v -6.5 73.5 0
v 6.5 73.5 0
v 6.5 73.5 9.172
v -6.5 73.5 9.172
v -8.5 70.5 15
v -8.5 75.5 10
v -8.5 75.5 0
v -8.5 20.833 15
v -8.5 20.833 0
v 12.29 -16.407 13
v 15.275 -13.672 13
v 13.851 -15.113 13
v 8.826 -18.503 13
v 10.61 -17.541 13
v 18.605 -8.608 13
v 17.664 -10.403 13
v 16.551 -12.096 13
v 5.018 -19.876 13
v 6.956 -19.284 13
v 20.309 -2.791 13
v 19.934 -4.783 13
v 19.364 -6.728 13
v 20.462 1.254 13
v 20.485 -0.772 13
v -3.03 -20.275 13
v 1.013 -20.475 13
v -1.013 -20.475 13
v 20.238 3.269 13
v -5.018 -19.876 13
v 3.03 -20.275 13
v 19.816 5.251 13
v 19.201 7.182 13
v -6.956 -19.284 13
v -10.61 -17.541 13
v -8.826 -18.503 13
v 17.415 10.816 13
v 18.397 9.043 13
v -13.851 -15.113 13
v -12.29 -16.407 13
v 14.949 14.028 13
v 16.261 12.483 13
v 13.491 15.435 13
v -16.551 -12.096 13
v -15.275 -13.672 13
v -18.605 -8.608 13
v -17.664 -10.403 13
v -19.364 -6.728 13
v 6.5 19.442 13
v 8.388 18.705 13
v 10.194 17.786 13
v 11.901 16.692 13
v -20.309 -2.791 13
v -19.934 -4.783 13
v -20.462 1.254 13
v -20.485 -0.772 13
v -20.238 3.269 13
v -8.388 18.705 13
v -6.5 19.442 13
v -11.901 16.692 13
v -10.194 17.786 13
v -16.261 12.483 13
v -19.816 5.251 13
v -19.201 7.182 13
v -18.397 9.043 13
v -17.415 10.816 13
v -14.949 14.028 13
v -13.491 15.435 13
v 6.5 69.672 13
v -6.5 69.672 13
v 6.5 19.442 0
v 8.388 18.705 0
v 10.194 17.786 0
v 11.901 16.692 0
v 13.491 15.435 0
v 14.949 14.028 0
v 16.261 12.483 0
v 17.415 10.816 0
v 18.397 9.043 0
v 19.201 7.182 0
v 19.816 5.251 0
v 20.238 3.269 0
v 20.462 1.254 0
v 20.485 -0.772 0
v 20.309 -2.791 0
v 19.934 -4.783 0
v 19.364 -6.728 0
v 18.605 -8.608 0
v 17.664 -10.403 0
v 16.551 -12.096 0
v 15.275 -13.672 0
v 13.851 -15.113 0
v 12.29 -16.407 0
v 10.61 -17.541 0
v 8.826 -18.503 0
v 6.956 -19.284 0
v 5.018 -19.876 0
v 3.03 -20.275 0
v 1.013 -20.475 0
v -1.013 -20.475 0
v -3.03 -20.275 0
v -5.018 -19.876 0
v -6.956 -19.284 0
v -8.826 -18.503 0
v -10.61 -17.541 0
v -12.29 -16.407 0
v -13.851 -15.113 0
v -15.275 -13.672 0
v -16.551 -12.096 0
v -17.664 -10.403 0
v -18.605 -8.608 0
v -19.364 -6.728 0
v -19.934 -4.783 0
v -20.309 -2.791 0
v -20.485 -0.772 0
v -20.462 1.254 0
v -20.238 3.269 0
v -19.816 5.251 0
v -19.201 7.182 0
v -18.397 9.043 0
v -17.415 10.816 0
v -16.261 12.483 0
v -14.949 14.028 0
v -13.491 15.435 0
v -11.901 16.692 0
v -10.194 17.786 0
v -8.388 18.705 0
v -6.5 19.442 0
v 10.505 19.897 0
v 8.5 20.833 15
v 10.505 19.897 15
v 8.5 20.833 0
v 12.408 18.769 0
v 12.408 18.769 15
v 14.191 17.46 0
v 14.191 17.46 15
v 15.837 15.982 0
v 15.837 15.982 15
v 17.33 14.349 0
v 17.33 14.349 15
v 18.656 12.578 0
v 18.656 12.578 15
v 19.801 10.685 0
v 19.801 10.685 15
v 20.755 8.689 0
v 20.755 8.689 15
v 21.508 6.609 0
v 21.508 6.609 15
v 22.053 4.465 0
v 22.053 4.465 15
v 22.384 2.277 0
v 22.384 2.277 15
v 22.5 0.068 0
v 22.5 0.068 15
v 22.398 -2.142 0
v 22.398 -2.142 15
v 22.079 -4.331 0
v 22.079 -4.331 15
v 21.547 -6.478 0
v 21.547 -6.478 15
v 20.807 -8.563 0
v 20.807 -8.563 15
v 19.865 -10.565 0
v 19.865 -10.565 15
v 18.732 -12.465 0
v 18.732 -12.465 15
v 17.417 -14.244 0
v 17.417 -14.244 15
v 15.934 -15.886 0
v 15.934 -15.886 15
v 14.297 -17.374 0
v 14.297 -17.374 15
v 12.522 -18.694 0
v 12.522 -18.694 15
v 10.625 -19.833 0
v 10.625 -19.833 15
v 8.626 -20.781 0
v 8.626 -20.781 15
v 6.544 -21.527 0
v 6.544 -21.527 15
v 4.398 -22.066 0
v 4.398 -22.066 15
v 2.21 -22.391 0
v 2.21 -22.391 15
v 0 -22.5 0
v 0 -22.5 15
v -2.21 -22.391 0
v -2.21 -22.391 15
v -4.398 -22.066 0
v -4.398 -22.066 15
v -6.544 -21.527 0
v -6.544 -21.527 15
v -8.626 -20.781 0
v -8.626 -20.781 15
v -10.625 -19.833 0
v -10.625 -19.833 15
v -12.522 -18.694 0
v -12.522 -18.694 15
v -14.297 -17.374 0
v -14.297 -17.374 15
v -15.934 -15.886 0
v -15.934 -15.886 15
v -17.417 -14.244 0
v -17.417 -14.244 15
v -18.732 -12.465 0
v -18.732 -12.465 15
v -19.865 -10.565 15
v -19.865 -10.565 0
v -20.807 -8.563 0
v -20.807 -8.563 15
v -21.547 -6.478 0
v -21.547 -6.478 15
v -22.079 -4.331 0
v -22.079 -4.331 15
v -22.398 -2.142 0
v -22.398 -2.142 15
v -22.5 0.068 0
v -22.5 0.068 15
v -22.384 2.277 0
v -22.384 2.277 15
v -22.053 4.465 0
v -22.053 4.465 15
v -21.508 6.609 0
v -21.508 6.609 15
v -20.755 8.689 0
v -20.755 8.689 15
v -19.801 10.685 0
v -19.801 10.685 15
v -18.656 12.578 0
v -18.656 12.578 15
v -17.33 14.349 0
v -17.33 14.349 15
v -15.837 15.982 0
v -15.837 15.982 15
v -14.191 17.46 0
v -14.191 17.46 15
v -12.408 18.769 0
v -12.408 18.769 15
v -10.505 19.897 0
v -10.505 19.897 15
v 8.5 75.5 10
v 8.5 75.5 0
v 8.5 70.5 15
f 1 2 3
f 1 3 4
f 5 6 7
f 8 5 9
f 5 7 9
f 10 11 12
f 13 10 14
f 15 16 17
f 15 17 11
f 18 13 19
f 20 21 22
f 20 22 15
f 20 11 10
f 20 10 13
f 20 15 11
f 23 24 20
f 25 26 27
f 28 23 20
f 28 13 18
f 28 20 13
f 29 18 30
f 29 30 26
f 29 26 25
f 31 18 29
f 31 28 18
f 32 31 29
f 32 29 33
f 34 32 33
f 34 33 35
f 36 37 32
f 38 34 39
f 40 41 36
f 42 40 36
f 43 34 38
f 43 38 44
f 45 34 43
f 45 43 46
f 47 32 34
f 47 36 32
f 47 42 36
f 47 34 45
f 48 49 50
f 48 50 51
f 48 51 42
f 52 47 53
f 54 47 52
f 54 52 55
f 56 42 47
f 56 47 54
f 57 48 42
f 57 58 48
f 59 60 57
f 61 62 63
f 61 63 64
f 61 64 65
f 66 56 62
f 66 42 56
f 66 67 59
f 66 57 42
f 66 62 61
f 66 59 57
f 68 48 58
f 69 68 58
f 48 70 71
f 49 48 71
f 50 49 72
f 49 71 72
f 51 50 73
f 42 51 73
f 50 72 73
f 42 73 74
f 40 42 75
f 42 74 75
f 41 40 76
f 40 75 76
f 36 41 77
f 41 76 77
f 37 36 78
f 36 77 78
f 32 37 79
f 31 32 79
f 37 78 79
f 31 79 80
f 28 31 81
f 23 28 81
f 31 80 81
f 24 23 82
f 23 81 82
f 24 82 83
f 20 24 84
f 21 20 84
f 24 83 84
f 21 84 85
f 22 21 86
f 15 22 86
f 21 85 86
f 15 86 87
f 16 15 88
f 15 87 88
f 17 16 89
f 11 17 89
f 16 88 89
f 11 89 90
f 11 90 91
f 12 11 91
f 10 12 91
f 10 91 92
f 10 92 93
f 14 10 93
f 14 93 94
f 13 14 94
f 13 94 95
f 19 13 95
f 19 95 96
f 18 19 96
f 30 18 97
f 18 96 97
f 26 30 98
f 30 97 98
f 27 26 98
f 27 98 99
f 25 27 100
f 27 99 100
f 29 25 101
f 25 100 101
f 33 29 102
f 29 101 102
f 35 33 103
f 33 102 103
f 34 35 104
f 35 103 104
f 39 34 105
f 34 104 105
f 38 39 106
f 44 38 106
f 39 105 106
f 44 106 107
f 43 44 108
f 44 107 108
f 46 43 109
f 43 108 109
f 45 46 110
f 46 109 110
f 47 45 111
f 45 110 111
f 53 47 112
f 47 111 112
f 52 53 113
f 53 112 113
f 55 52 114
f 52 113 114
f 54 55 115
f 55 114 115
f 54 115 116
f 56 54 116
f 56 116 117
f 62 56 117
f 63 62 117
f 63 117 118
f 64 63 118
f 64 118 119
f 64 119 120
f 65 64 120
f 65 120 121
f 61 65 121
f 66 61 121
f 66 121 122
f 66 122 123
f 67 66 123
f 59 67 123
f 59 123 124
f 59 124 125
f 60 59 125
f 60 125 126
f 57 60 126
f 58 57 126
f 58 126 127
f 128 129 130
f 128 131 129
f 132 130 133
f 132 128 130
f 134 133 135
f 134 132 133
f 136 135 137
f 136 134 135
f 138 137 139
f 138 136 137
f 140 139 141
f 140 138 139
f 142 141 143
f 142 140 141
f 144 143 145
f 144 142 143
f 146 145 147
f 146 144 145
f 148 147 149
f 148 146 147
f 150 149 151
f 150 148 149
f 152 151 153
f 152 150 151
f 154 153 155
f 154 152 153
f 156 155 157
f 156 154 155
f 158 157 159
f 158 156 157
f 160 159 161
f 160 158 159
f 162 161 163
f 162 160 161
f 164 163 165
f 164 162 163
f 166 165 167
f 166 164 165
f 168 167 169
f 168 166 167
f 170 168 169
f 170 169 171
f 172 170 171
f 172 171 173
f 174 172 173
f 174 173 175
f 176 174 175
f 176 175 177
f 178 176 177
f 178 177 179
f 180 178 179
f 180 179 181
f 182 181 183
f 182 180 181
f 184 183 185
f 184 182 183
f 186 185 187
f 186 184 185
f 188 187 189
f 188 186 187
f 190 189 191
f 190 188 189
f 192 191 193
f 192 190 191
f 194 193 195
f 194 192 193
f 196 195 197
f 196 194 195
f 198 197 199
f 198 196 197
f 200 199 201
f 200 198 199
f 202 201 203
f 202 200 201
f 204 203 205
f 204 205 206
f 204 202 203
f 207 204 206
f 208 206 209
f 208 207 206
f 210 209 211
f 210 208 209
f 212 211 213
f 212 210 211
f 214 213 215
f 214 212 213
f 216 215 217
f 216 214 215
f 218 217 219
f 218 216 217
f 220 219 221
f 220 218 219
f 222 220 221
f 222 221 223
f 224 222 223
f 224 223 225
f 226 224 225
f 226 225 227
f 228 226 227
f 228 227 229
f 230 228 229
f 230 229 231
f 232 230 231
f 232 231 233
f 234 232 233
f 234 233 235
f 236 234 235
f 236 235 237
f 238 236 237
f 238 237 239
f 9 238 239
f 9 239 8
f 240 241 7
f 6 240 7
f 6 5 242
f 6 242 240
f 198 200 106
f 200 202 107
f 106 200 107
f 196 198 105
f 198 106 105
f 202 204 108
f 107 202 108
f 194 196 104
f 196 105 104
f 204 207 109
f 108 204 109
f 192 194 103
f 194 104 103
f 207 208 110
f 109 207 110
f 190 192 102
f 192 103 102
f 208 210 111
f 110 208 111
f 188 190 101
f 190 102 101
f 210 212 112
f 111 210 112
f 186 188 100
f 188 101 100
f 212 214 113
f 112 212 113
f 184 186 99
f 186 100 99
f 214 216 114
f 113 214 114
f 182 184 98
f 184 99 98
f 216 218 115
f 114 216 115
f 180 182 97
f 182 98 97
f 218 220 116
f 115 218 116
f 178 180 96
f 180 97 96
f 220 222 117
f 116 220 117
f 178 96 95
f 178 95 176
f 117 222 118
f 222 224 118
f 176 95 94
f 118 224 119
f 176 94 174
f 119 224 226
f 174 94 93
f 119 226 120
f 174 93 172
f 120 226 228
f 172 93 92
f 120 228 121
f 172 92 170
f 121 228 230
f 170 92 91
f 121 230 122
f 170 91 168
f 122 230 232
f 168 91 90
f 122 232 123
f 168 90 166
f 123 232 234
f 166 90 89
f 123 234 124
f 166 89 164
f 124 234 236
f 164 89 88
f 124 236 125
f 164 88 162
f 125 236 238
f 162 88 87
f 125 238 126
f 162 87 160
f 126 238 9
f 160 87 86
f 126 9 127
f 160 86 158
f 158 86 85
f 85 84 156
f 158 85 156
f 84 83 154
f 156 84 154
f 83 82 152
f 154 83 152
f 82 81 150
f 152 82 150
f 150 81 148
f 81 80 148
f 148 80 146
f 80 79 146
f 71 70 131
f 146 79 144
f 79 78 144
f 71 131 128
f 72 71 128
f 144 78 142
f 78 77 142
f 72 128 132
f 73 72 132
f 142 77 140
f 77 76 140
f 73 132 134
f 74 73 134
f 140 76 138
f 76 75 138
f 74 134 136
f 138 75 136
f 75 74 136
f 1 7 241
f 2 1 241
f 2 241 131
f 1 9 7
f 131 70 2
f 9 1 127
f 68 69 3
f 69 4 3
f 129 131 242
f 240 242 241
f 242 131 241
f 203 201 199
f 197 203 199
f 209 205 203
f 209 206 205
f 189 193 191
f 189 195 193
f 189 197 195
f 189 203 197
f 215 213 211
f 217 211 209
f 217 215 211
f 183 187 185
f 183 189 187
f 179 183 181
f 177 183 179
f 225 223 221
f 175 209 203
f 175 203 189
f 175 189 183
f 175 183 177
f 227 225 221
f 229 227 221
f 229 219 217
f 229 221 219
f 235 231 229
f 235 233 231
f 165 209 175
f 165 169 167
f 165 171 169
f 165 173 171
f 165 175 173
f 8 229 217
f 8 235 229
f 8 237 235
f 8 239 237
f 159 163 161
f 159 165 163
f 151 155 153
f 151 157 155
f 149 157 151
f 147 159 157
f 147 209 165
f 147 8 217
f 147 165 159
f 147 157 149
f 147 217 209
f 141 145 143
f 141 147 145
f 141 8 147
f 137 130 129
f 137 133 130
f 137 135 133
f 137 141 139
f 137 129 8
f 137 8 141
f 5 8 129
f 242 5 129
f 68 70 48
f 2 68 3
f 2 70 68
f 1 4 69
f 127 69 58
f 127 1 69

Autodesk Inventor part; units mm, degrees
ref_plane "YZ Plane" through (0, 0, 0) normal (1, 0, 0) x (0, 1, 0)
ref_plane "XZ Plane" through (0, 0, 0) normal (0, 1, 0) x (-1, 0, 0)
ref_plane "XY Plane" through (0, 0, 0) normal (0, 0, 1) x (1, 0, 0)
sketch "Sketch3" plane through (0, 0, 0) normal (0, 0, 1) x (1, 0, 0)
  circle A0 centre (0, 0) radius 22.5
  line L0 (-8.5, 0) -> (8.5, 0)
  line L1 (8.5, 0) -> (8.5, 75.5)
  line L2 (8.5, 75.5) -> (-8.5, 75.5)
  line L3 (-8.5, 75.5) -> (-8.5, 0)
  dimension "d5" = 45
  dimension "d6" = 75.5
  dimension "d7" = 17
extrude "Extrusion3" add sketch "Sketch3" along normal blind 15
sketch "Sketch4" plane through (0, 0, 0) normal (0, 0, -1) x (-1, 0, 0)
  arc A0 (-8.5, 20.8327) -> (8.5, 20.8327) centre (0, 0) ccw projected
  line L0 (8.5, 75.5) -> (8.5, 20.8327) projected
  line L1 (-8.5, 75.5) -> (8.5, 75.5) projected
  line L2 (-8.5, 20.8327) -> (-8.5, 75.5) projected
  arc A1 (-6.5, 19.4422) -> (6.5, 19.4422) centre (0, 0) ccw
  line L3 (-6.5, 19.4422) -> (-6.5, 73.5)
  line L4 (-6.5, 73.5) -> (6.5, 73.5)
  line L5 (6.5, 73.5) -> (6.5, 19.4422)
  dimension "d10" = 2
extrude "Extrusion4" cut sketch "Sketch4" against normal blind 13 contours L3 L4 L5 A1
chamfer "Chamfer1" distance 5 angle 45 1 edges at (0, 75.5, 15)
sketch "Sketch6" plane through (-8.5, 70.5, 15) normal (0, 0.7071068, 0.7071068) x (1, 0, 0)
  line L0 (2, 2.8284) -> (2, 4.2426) projected
  line L1 (2, 4.2426) -> (15, 4.2426) projected
  line L2 (15, 4.2426) -> (15, 2.8284) projected
  line L3 (15, 2.8284) -> (2, 2.8284) projected
  line L4 (0, 7.0711) -> (0, 0) projected
  line L5 (0, 0) -> (17, 0) projected
  line L6 (17, 0) -> (17, 7.0711) projected
  line L7 (17, 7.0711) -> (0, 7.0711) projected
  point P0 (8.5, -39.2444)
extrude "Extrusion5" add sketch "Sketch6" against normal blind 2 contours L0 L1 L2 L3 | L7 L6 L5 L4
properties part number "TARM10" material "ABS Plastic"
